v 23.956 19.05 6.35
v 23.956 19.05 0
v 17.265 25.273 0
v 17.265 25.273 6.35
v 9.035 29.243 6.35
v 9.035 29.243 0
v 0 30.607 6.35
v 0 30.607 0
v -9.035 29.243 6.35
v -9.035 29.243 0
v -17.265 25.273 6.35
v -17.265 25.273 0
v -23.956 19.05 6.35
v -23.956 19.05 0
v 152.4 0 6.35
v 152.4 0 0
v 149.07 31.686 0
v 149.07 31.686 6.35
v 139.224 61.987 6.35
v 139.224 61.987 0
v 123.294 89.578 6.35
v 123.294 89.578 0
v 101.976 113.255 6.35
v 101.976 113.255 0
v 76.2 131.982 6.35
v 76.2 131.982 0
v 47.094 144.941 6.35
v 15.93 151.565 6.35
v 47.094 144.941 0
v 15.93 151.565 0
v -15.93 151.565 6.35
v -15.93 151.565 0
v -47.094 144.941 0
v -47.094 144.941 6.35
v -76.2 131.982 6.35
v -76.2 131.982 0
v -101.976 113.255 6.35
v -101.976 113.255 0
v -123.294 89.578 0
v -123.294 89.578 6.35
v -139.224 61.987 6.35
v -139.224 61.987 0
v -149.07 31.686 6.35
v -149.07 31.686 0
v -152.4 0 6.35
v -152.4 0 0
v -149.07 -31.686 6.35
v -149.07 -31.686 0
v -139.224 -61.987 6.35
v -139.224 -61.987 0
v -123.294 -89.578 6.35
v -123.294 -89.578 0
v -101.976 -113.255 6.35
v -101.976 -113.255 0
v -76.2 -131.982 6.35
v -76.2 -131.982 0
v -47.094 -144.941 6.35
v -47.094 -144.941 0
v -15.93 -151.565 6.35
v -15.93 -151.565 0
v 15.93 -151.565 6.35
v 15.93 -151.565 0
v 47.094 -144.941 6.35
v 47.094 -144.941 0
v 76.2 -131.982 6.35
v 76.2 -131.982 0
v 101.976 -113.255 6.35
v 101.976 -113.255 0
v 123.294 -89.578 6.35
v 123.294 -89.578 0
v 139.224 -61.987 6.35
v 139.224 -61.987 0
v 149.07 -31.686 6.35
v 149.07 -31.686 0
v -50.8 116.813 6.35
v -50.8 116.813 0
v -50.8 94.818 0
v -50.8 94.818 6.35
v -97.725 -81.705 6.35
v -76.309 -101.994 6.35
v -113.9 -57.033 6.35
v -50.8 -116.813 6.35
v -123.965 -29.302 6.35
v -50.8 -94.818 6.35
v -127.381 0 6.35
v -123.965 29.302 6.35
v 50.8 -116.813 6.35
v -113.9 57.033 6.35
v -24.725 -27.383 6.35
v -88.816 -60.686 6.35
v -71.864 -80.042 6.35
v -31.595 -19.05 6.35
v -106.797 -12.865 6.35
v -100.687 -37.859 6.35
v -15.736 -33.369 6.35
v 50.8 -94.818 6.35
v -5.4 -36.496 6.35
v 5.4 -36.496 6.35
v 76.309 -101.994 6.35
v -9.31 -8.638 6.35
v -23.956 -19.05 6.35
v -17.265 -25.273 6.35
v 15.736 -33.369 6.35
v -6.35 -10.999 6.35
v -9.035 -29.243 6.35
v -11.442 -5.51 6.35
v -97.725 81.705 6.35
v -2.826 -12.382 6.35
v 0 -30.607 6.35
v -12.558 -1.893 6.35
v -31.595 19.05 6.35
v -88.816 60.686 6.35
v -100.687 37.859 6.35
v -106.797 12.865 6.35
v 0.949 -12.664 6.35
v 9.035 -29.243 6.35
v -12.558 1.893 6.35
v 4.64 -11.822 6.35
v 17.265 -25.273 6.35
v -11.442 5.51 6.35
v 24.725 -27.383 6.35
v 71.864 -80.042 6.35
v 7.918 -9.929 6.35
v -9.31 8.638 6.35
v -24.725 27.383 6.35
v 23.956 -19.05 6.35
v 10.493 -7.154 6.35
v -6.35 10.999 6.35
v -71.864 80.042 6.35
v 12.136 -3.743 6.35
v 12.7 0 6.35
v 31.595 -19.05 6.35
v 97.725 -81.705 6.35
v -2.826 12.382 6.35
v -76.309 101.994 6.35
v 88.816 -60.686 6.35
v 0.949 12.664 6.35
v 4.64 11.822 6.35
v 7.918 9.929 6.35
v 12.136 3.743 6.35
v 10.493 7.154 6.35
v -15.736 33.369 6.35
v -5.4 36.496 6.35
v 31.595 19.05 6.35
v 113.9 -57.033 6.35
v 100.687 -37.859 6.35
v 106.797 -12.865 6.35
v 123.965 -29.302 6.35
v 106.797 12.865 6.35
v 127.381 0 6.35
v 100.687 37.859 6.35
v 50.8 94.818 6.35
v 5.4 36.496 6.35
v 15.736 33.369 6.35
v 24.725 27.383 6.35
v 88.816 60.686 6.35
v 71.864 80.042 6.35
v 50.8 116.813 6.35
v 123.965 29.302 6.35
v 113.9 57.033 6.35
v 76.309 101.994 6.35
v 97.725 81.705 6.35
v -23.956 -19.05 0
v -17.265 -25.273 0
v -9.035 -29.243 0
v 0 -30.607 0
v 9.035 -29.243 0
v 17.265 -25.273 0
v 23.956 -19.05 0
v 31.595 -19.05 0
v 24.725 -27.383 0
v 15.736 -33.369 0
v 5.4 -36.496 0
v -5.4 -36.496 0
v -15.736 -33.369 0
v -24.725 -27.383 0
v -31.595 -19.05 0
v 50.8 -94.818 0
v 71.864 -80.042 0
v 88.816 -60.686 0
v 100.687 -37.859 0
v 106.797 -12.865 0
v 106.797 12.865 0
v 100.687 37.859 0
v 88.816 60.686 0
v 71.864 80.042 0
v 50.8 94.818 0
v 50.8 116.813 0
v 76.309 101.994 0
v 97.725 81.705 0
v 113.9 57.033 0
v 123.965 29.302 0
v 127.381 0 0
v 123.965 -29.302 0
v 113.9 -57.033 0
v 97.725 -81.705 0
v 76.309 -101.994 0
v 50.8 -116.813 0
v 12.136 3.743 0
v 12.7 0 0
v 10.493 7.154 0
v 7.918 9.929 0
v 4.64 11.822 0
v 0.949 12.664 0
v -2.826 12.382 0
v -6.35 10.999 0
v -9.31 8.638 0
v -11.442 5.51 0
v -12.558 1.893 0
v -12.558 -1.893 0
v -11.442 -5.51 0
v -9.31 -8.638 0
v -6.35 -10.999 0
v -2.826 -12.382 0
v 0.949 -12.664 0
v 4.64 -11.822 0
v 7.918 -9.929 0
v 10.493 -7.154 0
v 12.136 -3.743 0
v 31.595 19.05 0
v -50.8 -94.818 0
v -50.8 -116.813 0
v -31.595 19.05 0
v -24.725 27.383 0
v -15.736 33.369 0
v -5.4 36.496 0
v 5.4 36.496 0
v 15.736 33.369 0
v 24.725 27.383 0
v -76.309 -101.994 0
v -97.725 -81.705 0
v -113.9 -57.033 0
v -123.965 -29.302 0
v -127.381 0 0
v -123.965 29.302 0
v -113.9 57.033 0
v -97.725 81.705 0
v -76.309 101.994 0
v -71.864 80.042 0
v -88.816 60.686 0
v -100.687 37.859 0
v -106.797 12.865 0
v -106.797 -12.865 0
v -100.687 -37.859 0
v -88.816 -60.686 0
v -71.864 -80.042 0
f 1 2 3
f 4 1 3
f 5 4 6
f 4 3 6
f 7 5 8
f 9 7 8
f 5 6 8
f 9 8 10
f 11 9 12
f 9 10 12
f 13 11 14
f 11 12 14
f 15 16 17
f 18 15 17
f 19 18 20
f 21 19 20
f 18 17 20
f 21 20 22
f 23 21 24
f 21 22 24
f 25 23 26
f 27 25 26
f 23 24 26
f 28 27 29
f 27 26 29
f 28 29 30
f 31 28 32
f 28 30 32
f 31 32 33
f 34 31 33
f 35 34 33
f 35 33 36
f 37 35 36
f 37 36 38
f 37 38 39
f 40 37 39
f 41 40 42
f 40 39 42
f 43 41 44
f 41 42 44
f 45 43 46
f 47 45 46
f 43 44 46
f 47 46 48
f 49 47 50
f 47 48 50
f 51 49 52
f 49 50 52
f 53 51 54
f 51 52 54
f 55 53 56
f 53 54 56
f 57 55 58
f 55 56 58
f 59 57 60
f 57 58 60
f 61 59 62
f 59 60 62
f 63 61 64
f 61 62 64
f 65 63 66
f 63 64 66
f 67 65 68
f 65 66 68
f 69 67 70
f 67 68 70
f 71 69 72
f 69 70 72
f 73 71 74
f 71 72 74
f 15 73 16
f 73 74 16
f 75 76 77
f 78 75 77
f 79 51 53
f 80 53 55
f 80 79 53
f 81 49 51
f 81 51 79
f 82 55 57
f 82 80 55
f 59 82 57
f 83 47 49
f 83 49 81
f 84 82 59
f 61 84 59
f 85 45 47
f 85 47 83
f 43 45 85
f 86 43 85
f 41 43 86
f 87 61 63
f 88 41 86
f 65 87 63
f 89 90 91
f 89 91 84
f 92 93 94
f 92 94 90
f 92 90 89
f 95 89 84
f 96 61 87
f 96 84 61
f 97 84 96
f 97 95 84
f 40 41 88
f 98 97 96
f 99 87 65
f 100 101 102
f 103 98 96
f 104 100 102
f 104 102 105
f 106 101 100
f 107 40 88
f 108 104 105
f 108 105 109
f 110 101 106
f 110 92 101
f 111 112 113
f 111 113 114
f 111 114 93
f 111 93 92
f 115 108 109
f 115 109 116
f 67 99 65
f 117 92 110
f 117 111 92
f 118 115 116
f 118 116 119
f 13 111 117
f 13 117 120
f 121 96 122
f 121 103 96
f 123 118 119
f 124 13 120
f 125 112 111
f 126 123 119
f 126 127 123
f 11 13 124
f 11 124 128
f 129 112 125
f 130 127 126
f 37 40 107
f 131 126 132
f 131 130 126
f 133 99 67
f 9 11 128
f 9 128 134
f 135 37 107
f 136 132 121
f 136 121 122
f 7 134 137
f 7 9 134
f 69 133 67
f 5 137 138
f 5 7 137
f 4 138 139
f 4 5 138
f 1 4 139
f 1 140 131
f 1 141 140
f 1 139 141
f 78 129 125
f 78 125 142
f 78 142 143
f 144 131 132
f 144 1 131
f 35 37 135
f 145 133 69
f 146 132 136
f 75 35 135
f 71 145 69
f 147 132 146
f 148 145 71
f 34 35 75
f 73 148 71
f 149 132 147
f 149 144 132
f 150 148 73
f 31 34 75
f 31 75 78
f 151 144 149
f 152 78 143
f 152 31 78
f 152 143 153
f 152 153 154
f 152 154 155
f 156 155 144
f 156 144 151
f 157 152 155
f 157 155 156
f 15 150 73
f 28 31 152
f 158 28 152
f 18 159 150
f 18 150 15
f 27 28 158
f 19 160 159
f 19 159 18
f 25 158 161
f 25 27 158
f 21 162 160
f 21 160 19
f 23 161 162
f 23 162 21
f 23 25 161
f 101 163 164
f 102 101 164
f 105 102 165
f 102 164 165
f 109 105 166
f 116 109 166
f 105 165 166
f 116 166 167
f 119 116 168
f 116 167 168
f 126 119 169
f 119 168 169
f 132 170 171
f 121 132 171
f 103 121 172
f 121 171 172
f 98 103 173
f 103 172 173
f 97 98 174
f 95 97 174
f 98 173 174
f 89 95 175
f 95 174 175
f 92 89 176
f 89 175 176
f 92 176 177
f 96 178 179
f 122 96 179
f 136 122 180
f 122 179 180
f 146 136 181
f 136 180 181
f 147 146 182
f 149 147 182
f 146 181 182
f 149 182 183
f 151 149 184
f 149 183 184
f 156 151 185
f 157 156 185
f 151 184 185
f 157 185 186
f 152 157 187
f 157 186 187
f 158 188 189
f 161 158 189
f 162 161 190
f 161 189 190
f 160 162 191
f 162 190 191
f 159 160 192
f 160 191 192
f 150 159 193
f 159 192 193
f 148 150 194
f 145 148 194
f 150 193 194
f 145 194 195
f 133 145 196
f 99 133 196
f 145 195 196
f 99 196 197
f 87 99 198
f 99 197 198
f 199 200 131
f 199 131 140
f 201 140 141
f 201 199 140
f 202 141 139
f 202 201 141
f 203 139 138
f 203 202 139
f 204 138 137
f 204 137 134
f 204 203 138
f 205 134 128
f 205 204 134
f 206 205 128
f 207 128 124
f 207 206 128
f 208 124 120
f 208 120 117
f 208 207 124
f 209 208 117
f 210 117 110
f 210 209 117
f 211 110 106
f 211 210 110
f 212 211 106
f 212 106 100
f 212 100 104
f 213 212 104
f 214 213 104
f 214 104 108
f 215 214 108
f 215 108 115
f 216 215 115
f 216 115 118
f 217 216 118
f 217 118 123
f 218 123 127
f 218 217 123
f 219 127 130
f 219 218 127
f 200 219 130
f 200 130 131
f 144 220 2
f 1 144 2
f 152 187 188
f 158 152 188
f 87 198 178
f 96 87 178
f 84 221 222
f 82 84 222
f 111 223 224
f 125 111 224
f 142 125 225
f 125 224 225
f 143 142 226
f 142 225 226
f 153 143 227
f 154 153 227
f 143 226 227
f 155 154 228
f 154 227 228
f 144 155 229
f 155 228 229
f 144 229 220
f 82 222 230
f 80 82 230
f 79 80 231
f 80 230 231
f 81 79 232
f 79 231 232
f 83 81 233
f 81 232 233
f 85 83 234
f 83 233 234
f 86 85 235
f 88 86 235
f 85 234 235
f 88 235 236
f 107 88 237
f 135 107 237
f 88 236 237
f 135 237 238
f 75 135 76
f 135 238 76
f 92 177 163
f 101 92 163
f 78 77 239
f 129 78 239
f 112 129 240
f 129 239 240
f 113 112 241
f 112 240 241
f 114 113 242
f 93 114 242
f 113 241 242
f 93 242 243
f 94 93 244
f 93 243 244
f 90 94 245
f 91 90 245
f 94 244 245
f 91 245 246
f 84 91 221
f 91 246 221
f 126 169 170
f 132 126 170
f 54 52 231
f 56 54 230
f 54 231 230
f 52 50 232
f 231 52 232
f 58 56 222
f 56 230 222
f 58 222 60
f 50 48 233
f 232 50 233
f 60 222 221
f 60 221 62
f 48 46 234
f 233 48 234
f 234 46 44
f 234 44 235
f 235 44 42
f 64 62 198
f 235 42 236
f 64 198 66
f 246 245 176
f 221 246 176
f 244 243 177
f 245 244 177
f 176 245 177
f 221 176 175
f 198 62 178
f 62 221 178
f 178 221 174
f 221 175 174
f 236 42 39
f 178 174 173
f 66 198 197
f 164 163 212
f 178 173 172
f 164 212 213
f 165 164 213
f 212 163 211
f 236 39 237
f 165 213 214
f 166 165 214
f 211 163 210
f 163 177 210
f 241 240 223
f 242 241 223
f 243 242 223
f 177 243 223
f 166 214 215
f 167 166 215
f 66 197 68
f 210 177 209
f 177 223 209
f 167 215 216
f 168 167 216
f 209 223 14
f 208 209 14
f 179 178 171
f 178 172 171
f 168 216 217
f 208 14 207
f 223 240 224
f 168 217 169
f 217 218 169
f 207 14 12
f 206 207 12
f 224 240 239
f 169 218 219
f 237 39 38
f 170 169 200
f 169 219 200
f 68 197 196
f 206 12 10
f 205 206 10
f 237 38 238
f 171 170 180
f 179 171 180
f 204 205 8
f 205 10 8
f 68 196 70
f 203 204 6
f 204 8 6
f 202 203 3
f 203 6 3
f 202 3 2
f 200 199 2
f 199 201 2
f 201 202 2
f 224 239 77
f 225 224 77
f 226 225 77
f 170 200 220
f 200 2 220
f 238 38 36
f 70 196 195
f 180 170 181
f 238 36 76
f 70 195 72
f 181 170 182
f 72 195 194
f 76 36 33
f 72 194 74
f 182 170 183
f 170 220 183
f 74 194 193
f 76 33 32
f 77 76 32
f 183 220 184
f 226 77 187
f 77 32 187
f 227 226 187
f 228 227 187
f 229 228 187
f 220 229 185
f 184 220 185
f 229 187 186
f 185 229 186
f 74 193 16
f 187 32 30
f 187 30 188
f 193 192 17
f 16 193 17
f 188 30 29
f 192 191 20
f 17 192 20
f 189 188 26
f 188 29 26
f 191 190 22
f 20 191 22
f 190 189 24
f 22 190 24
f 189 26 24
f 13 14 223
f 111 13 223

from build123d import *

# Parameters (mm, degrees)
F0_R     = 152.4
F0_R_2   = 12.7
F1_DEPTH = 6.35


with BuildPart() as f1:
    # F0 (on Top) → F1 (new body)
    with BuildSketch(Plane.XY):
        Circle(F0_R)
        with BuildLine():
            ThreePointArc((31.594744, -19.05), (0, -36.8935), (-31.594744, -19.05))
            Line((-31.594744, -19.05), (-23.955917, -19.05))
            ThreePointArc((-23.955917, -19.05), (0, -30.607), (23.955917, -19.05))
            Line((23.955917, -19.05), (31.594744, -19.05))
        make_face(mode=Mode.SUBTRACT)
        with BuildLine():
            ThreePointArc((-50.8, -116.813009), (-127.381, 0), (-50.8, 116.813009))
            Line((-50.8, 116.813009), (-50.8, 94.817982))
            ThreePointArc((-50.8, 94.817982), (-107.569, 0), (-50.8, -94.817982))
            Line((-50.8, -94.817982), (-50.8, -116.813009))
        make_face(mode=Mode.SUBTRACT)
        Circle(F0_R_2, mode=Mode.SUBTRACT)
        with BuildLine():
            Line((-23.955917, 19.05), (-31.594744, 19.05))
            ThreePointArc((-31.594744, 19.05), (0, 36.8935), (31.594744, 19.05))
            Line((31.594744, 19.05), (23.955917, 19.05))
            ThreePointArc((23.955917, 19.05), (0, 30.607), (-23.955917, 19.05))
        make_face(mode=Mode.SUBTRACT)
        with BuildLine():
            Line((50.8, 94.817982), (50.8, 116.813009))
            ThreePointArc((50.8, 116.813009), (127.381, 0), (50.8, -116.813009))
            Line((50.8, -116.813009), (50.8, -94.817982))
            ThreePointArc((50.8, -94.817982), (107.569, 0), (50.8, 94.817982))
        make_face(mode=Mode.SUBTRACT)
    extrude(amount=F1_DEPTH)


solid = f1.part
